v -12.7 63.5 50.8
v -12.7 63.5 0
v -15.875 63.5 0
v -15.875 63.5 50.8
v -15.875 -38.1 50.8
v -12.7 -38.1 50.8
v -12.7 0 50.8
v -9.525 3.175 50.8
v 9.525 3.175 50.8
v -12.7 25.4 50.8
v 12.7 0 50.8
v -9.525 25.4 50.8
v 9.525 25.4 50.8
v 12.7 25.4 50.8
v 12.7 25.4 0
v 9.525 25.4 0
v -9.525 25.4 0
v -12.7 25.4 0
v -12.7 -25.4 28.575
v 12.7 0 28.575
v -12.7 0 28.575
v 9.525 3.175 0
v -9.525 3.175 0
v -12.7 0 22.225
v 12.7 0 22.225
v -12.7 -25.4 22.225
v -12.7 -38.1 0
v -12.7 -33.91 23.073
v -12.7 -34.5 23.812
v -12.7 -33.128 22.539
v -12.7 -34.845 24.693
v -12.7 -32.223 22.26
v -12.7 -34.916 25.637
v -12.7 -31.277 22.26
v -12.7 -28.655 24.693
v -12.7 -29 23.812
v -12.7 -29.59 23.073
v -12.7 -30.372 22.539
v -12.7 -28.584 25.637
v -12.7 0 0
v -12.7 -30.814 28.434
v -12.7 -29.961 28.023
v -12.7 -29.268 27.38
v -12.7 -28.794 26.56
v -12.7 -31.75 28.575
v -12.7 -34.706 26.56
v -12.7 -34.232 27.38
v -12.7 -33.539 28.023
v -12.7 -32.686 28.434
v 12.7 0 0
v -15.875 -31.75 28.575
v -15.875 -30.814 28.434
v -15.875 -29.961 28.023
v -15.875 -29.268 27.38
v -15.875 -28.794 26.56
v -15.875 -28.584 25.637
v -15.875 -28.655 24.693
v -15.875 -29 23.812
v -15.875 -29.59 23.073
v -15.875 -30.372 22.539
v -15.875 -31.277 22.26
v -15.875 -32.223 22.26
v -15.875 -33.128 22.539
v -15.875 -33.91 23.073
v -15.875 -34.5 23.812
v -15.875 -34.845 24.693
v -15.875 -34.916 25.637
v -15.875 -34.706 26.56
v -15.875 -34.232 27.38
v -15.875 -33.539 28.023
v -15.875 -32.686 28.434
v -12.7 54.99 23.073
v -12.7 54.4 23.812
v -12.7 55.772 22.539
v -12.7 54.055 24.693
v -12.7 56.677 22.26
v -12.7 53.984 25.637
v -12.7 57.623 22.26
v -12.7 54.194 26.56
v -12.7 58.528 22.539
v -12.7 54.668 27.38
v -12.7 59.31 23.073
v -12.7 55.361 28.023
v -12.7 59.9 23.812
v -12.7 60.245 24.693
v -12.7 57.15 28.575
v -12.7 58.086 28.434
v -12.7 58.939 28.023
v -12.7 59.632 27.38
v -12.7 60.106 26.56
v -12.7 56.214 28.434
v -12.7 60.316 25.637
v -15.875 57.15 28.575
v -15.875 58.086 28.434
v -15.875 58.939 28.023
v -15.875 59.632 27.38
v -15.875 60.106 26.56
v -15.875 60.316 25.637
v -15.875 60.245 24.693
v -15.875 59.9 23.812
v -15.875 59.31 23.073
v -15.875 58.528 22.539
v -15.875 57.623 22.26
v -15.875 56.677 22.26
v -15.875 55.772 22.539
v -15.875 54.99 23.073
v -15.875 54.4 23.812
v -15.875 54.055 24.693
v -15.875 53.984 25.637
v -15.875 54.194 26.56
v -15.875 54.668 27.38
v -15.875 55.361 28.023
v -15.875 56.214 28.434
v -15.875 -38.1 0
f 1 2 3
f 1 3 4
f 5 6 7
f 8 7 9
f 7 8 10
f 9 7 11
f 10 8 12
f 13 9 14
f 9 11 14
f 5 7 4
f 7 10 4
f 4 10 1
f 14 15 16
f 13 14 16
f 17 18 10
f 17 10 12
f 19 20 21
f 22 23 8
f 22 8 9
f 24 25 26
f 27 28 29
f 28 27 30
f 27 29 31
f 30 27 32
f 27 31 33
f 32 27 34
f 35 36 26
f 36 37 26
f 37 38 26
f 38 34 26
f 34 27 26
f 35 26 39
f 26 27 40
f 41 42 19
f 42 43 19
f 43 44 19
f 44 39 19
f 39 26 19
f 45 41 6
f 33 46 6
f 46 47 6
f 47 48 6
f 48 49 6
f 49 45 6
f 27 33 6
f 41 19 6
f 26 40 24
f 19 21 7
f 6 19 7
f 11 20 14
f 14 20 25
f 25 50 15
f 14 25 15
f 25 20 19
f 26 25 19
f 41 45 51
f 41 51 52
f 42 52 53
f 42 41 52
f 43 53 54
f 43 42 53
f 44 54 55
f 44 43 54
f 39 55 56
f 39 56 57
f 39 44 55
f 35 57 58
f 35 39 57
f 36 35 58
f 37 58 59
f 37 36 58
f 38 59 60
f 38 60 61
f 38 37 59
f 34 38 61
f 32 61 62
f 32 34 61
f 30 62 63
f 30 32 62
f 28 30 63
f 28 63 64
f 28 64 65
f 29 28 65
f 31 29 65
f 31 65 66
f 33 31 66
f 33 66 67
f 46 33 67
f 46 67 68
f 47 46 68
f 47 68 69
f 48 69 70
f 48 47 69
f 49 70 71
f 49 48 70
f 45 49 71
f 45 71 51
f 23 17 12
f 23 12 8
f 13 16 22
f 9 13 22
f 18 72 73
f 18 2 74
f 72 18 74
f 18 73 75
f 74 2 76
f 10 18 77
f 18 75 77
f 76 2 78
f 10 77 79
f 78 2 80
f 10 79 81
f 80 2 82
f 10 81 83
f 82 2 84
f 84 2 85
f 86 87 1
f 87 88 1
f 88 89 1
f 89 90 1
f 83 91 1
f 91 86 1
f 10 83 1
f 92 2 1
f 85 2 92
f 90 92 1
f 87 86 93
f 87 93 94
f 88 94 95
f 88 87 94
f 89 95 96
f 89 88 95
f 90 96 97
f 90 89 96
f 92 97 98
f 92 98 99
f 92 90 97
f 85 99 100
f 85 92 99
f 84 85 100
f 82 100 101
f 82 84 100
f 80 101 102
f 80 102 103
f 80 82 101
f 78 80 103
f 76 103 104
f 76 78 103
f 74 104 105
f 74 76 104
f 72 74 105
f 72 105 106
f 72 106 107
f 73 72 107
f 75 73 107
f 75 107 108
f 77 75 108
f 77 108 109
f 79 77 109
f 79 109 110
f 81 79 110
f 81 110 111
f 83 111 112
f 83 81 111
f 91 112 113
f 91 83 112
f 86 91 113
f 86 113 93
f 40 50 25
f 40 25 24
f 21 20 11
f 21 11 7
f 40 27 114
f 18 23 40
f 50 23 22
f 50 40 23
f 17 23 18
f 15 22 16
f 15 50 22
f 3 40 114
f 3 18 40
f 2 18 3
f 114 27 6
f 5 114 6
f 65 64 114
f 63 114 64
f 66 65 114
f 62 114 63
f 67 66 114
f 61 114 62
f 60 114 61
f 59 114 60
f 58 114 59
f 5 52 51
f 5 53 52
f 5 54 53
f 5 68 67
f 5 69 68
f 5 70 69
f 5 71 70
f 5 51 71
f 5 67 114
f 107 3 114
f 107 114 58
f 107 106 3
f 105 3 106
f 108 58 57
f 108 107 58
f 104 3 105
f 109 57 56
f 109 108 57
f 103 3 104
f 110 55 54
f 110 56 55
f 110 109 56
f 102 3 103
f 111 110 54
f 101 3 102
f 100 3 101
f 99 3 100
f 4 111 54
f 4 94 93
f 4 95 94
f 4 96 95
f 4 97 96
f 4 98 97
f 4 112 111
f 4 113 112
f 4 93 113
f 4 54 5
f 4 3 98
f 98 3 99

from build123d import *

# Parameters (mm, degrees)
BOSS_EXTRUDE1_DEPTH      = 50.8
SKETCH3_W                = 50.8
SKETCH3_H                = 101.6
SKETCH3_R                = 3.175
BOSS_EXTRUDE2_DEPTH      = 3.175
BOSS_EXTRUDE3_DEPTH      = 3.175
BOSS_EXTRUDE3_DEPTH_BACK = 3.175


with BuildPart() as part:
    # Sketch1 → Boss-Extrude1 (new body)
    with BuildSketch(Plane.XY):
        Polygon((0, 0), (12.7, 0), (12.7, 25.4), (9.525, 25.4), (9.525, 3.175), (0, 3.175), align=None)
    extrude(amount=BOSS_EXTRUDE1_DEPTH)

    # Mirror1: part across plane


with BuildPart() as part_1:
    add(part.part)
    add(part.part.mirror(Plane(origin=(0, 3.175, 50.8), x_dir=(0, 0, 1), z_dir=(1, 0, 0))))

    # Sketch3 → Boss-Extrude2 (add)
    with BuildSketch(Plane.ZY.offset(12.7)):
        with Locations((25.4, 12.7)):
            Rectangle(SKETCH3_W, SKETCH3_H)
        with Locations((25.4, 57.15)):
            Circle(SKETCH3_R, mode=Mode.SUBTRACT)
        with Locations((25.4, -31.75)):
            Circle(SKETCH3_R, mode=Mode.SUBTRACT)
    extrude(amount=BOSS_EXTRUDE2_DEPTH)

    # Sketch4 → Boss-Extrude3 (add, two sides: drawn at the far end of the back side and taken through both)
    with BuildSketch(Plane(origin=(0, 0, 25.4), x_dir=(-1, 0, 0), z_dir=(0, 0, -1)).offset(-BOSS_EXTRUDE3_DEPTH_BACK)):
        Polygon((-12.7, 0), (12.7, -25.4), (12.7, 0), align=None)
    extrude(amount=BOSS_EXTRUDE3_DEPTH + BOSS_EXTRUDE3_DEPTH_BACK)


solid = part_1.part
